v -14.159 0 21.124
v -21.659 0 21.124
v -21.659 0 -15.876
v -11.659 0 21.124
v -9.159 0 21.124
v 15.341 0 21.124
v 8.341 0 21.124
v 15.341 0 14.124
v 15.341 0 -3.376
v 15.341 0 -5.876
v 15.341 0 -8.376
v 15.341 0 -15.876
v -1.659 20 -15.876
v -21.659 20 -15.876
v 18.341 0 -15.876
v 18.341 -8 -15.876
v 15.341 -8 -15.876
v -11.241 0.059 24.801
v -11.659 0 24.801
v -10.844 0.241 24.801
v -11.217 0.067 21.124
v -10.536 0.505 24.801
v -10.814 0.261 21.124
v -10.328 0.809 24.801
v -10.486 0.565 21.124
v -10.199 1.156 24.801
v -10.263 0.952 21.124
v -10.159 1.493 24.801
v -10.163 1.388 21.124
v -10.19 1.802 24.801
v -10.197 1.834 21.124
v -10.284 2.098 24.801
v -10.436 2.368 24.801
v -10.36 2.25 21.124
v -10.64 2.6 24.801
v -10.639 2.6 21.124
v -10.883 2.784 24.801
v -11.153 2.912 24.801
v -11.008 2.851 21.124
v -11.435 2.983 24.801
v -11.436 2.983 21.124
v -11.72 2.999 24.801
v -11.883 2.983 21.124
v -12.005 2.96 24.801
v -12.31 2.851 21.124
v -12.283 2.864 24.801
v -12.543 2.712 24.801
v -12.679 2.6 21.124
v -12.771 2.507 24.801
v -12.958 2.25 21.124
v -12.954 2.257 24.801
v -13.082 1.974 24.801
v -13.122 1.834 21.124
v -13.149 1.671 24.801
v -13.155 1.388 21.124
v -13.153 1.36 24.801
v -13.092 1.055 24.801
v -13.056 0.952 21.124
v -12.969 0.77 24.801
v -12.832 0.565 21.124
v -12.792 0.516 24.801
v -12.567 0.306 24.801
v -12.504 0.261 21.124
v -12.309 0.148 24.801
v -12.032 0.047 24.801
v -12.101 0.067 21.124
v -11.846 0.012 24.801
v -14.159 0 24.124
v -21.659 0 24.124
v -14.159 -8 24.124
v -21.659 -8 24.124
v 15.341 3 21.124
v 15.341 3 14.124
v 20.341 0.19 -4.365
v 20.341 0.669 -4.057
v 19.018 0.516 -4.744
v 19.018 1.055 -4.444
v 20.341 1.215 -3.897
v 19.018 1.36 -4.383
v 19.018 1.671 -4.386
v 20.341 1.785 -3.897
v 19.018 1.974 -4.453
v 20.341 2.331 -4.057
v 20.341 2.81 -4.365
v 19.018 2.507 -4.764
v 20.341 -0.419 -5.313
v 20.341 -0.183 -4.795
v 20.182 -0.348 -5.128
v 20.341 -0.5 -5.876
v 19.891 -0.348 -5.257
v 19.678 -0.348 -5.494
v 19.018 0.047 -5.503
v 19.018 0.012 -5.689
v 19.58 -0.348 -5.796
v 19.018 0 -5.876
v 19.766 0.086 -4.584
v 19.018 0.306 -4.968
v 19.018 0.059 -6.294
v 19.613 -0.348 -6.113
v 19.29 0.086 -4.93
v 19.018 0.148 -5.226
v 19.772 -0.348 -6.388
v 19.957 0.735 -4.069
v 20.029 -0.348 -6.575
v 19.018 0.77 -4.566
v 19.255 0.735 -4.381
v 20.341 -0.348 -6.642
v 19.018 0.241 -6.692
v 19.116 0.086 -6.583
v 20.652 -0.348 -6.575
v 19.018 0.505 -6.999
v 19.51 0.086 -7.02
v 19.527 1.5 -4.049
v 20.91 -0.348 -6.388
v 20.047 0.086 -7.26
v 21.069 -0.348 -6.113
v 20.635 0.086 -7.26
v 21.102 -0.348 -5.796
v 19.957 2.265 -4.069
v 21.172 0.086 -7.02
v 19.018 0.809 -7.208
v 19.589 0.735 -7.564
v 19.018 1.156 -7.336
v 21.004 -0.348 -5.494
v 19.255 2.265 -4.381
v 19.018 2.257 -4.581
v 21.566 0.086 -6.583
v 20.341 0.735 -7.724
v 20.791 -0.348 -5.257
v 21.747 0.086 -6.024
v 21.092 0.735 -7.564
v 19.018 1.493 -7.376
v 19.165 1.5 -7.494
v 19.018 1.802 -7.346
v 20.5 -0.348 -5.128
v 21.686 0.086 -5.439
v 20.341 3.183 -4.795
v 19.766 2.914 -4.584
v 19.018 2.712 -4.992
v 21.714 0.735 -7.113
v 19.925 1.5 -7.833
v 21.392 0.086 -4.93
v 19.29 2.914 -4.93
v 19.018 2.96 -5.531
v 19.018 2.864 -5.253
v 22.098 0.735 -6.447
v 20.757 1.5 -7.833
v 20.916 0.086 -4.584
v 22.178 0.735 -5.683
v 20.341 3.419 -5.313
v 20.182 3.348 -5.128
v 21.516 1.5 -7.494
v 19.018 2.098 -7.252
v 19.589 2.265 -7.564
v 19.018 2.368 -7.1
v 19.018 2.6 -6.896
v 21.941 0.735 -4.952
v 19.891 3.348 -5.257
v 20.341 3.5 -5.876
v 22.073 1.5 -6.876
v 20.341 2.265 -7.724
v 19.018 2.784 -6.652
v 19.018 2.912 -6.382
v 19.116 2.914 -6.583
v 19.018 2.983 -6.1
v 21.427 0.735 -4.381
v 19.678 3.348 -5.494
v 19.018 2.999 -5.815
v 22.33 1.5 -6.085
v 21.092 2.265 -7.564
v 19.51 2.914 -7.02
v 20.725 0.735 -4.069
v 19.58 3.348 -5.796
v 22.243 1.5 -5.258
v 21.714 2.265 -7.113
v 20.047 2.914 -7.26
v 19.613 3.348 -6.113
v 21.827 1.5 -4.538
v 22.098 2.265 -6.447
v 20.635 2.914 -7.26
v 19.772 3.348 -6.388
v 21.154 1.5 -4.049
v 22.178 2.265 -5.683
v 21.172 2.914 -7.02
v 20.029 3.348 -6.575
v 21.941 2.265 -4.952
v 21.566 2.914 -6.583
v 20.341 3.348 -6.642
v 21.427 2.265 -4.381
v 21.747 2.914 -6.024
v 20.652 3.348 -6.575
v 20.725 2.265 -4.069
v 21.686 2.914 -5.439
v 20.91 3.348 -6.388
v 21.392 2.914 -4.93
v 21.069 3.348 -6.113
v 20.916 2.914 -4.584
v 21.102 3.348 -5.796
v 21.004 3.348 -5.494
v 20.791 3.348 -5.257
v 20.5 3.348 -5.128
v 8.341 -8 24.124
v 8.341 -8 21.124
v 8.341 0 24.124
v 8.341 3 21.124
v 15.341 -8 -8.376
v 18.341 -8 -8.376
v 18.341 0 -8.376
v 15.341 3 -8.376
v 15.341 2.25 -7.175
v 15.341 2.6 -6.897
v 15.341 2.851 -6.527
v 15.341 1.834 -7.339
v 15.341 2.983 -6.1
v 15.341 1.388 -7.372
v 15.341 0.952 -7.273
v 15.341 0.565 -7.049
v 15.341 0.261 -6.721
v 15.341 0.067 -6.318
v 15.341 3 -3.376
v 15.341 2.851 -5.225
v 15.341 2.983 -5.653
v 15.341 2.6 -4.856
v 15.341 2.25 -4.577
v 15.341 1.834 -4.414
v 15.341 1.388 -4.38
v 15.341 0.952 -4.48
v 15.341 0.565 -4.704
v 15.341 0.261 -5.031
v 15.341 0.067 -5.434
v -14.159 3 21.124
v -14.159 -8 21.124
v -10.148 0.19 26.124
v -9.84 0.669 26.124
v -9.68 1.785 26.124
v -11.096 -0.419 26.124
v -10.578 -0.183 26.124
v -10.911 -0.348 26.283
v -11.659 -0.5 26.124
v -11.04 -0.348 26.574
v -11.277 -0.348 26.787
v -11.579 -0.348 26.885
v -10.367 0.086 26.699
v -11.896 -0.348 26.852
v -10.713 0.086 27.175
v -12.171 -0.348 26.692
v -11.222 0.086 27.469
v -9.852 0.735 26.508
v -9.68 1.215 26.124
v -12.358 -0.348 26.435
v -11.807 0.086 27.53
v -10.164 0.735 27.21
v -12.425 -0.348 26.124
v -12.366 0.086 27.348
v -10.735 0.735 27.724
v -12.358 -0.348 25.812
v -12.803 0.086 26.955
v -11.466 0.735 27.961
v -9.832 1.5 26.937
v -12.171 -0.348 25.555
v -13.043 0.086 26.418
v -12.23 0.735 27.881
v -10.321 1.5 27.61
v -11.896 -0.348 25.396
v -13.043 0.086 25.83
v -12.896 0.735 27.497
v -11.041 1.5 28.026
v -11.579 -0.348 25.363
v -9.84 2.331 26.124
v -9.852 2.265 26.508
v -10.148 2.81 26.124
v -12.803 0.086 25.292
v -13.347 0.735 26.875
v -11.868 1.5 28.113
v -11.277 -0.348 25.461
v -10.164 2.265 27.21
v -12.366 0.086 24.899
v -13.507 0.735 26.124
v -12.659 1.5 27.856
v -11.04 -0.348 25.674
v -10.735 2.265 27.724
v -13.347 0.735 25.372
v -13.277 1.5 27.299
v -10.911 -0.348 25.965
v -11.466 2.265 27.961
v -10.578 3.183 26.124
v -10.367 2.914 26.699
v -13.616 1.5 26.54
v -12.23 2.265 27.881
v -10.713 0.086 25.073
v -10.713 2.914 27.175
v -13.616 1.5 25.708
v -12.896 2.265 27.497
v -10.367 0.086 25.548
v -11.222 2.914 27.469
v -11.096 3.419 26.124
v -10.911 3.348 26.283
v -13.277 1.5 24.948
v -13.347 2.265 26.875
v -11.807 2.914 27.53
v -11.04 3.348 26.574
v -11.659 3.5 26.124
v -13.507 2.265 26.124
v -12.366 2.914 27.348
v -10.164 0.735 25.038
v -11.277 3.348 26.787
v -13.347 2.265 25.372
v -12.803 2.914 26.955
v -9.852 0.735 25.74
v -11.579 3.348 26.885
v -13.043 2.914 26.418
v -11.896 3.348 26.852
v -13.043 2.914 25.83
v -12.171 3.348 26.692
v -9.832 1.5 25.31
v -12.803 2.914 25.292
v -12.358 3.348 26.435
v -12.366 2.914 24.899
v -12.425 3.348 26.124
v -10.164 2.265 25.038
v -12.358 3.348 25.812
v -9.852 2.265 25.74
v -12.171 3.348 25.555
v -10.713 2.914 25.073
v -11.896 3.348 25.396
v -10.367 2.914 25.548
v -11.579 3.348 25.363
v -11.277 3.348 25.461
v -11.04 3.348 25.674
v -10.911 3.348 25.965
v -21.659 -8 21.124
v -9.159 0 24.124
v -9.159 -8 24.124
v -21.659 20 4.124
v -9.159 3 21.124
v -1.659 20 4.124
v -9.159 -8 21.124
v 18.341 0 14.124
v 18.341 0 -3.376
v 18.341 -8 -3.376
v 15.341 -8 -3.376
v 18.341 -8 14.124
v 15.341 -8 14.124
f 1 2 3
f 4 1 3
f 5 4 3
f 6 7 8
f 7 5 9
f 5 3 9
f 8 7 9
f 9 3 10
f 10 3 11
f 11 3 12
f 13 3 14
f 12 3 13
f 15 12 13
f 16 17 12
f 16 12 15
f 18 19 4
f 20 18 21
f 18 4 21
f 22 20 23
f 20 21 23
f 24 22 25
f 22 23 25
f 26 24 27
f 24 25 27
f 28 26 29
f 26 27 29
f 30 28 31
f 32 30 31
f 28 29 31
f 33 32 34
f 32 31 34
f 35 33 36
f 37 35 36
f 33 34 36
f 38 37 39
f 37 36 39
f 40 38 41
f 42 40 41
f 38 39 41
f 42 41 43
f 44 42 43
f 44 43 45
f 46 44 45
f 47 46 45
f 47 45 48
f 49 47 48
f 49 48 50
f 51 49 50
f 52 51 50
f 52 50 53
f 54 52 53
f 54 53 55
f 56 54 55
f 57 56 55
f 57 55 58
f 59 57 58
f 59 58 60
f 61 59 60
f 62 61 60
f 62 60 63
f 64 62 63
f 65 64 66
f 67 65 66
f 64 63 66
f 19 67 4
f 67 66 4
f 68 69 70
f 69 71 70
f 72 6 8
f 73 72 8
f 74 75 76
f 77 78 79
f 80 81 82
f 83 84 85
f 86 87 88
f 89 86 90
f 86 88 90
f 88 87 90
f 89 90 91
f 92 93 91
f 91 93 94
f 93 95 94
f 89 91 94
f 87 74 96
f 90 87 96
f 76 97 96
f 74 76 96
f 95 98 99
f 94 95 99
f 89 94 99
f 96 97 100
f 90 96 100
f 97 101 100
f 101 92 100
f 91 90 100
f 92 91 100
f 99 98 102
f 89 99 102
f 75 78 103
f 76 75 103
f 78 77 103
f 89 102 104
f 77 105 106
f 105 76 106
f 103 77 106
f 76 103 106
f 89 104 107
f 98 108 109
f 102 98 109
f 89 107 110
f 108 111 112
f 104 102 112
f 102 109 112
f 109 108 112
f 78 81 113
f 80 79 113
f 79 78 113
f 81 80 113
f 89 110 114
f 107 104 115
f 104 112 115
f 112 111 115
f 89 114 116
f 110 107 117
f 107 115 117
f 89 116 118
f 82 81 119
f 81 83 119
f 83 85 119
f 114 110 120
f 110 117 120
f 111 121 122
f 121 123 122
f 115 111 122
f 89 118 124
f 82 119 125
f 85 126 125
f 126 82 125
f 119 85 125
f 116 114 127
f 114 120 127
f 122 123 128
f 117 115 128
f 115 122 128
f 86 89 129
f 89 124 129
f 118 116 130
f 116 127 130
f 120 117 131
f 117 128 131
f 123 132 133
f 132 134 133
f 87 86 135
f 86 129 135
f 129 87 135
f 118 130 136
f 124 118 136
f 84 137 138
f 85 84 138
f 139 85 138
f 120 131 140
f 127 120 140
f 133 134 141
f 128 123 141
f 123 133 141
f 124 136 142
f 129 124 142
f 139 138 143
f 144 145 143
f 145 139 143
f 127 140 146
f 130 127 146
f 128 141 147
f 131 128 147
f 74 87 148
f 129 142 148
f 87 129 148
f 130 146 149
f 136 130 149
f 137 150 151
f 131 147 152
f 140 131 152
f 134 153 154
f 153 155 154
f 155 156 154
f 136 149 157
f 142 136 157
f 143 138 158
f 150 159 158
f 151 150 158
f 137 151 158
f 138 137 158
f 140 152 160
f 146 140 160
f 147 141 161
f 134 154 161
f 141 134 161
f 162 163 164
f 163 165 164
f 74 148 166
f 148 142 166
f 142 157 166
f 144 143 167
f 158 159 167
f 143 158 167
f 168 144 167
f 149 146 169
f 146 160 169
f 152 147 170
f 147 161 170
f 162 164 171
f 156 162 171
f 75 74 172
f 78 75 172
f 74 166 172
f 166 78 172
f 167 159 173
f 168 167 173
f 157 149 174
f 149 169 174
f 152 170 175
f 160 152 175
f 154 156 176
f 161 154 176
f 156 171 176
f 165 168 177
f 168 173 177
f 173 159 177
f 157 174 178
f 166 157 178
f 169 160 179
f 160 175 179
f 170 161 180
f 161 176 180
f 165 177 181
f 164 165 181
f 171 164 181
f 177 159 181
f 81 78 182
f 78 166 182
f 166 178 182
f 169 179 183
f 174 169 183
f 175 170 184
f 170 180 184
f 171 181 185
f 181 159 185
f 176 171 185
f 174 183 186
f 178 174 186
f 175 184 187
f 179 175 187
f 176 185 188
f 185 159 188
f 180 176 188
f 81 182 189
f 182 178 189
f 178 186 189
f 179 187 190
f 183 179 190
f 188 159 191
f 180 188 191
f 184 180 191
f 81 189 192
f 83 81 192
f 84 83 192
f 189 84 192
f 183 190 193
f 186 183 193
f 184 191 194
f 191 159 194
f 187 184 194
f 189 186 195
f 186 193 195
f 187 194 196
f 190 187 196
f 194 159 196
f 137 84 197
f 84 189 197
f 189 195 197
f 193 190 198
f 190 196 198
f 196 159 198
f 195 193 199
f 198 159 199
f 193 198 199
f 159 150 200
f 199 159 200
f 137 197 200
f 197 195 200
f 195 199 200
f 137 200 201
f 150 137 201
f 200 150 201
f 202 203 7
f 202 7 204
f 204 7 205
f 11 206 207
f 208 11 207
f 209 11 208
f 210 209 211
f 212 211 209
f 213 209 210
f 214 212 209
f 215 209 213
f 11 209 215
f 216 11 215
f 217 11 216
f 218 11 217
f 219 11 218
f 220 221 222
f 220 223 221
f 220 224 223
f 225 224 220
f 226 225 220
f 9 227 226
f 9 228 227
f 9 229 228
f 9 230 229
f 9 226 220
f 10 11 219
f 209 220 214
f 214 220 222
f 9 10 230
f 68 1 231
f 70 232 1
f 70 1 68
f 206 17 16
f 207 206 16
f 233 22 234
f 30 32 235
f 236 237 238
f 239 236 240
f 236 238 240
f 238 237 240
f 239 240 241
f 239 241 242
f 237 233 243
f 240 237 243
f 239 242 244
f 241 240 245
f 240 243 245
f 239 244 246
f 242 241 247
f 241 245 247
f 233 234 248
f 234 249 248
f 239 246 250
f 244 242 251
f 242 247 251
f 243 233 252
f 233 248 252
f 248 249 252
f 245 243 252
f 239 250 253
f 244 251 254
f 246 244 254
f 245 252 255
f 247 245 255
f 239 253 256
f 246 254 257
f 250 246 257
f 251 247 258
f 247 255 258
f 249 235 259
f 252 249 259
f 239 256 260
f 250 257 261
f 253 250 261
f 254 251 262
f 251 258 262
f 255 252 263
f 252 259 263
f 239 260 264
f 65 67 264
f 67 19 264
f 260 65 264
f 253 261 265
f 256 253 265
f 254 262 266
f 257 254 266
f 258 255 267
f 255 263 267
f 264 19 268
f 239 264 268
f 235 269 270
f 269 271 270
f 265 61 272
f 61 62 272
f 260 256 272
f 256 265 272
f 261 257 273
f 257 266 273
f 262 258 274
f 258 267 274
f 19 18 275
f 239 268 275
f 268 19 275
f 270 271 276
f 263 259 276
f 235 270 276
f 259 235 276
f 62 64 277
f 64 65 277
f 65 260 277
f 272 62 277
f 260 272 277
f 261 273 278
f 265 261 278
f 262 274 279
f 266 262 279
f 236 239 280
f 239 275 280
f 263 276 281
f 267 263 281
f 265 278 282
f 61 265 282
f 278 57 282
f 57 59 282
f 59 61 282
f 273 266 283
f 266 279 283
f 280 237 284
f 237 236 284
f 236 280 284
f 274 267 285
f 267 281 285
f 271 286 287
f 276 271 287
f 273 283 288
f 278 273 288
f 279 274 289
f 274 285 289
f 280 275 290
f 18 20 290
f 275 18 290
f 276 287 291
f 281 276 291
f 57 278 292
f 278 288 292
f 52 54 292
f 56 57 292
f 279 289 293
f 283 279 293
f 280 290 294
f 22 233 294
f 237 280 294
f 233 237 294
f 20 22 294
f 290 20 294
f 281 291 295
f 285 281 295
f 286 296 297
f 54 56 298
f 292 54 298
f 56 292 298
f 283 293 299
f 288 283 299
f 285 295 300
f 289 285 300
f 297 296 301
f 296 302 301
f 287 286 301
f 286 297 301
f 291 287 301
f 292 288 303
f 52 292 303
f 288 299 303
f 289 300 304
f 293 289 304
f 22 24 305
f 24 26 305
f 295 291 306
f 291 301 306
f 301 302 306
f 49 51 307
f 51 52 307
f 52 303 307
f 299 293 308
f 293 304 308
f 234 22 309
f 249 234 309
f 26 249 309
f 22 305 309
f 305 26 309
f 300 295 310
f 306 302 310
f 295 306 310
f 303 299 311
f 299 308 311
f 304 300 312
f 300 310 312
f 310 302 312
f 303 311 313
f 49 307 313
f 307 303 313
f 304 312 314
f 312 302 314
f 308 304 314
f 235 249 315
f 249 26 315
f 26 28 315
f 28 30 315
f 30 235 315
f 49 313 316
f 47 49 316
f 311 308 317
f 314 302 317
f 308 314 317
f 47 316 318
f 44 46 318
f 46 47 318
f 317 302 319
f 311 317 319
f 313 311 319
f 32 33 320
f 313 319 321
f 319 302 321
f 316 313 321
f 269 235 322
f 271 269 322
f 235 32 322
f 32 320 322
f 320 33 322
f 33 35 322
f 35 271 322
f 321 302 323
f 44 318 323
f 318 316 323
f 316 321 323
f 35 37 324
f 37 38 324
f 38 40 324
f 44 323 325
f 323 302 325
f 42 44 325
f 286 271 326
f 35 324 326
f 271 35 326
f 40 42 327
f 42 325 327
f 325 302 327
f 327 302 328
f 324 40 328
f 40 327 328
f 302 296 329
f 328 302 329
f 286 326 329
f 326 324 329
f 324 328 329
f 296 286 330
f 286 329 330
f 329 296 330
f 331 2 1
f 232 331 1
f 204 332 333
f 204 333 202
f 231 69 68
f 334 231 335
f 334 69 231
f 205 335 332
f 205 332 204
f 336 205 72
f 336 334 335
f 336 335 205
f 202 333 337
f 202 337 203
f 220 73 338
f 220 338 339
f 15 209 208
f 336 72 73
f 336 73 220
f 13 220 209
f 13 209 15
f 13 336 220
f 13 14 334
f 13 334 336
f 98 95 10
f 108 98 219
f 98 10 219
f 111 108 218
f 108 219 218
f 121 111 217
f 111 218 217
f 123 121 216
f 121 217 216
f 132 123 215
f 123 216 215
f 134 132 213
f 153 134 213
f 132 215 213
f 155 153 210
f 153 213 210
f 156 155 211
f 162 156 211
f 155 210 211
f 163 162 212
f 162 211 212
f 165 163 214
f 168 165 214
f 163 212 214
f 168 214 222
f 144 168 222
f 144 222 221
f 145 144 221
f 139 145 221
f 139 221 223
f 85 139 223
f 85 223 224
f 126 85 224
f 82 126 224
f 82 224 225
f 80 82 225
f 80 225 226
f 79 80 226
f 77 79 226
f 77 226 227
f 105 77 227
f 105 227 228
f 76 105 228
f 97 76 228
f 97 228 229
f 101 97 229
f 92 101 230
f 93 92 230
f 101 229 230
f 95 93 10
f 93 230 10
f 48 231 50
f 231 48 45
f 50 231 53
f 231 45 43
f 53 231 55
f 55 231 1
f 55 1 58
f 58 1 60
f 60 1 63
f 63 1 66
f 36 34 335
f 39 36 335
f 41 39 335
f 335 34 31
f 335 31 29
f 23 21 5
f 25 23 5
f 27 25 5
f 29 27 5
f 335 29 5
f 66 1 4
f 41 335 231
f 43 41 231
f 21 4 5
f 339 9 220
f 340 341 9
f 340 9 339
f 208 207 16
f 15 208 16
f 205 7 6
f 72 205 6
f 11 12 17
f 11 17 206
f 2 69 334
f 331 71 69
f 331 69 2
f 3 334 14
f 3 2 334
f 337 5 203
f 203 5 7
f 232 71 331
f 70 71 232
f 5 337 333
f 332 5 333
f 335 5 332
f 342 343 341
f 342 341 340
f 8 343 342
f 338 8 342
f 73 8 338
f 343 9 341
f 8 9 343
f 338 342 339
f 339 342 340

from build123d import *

# Parameters (mm, degrees)
SKETCH1_W           = 40
SKETCH1_H           = 40
BOSS_EXTRUDE1_DEPTH = 20
CHAMFER1_SIZE       = 20
SKETCH2_W           = 3
SKETCH2_H           = 5
SKETCH2_W_2         = 5
SKETCH2_H_2         = 3
CUT_EXTRUDE1_DEPTH  = 20
SKETCH3_W           = 17.5
SKETCH3_H           = 3
SKETCH3_W_2         = 3
SKETCH3_H_2         = 17.5
SKETCH3_H_3         = 7.5
SKETCH3_W_3         = 7.5
BOSS_EXTRUDE2_DEPTH = 8
SKETCH4_R           = 1.5
BOSS_EXTRUDE3_DEPTH = 5
SKETCH6_R           = 1.5
BOSS_EXTRUDE4_DEPTH = 5


with BuildPart() as part:
    # Sketch1 → Boss-Extrude1 (new body)
    with BuildSketch(Plane(origin=(0, 0, 0), x_dir=(1, 0, 0), z_dir=(0, 1, 0))):
        with Locations((-1.65921027, -4.12371134)):
            Rectangle(SKETCH1_W, SKETCH1_H)
    extrude(amount=BOSS_EXTRUDE1_DEPTH)

    # Chamfer1
    chamfer1_edges = [part.edges().sort_by_distance(p)[0] for p in [
        (18.34078973, 20, 4.12371134),
        (-1.65921027, 20, 24.12371134),
    ]]
    chamfer(chamfer1_edges, length=CHAMFER1_SIZE - 0.0001)  # a hair under: the kernel refuses the full size

    # Sketch2 → Cut-Extrude1 (cut)
    with BuildSketch(Plane.XZ):
        Polygon((15.34078973, 21.12371134), (15.34078973, 14.12371134), (18.34078973, 14.12371134), (18.34078973, 24.12371134), (8.34078973, 24.12371134), (8.34078973, 21.12371134), align=None)
        with Locations((16.84078973, -5.87628866)):
            Rectangle(SKETCH2_W, SKETCH2_H)
        with Locations((-11.65921027, 22.62371134)):
            Rectangle(SKETCH2_W_2, SKETCH2_H_2)
    extrude(amount=-CUT_EXTRUDE1_DEPTH, mode=Mode.SUBTRACT)

    # Sketch3 → Boss-Extrude2 (add)
    with BuildSketch(Plane.XZ):
        with Locations((-0.40921027, 22.62371134)):
            Rectangle(SKETCH3_W, SKETCH3_H)
        with Locations((16.84078973, 5.37371134)):
            Rectangle(SKETCH3_W_2, SKETCH3_H_2)
        with Locations((16.84078973, -12.12628866)):
            Rectangle(SKETCH3_W_2, SKETCH3_H_3)
        with Locations((-17.90921027, 22.62371134)):
            Rectangle(SKETCH3_W_3, SKETCH3_H)
    extrude(amount=BOSS_EXTRUDE2_DEPTH)

    # Sketch4 → Boss-Extrude3 (add)
    with BuildSketch(Plane.XY.offset(21.12371134)):
        with Locations(Location((-11.65921027, 1.5, 0), (0, 0, 270))):
            Circle(SKETCH4_R)
    extrude(amount=BOSS_EXTRUDE3_DEPTH)

    # Sketch5 → Revolve1 (revolve)
    with BuildSketch(Plane.XY.offset(26.12371134)):
        with BuildLine():
            Line((-11.65921027, 3.5), (-11.65921027, -0.5))
            ThreePointArc((-11.65921027, -0.5), (-9.65921027, 1.5), (-11.65921027, 3.5))
        make_face()
    revolve(axis=Axis((-11.65921027, 3.5, 26.12371134), (0, -1, 0)))

    # Sketch6 → Boss-Extrude4 (add)
    with BuildSketch(Plane(origin=(15.34078973, 0, 0), x_dir=(0, 0, -1), z_dir=(1, 0, 0))):
        with Locations(Location((5.87628866, 1.5, 0), (0, 0, 270))):
            Circle(SKETCH6_R)
    extrude(amount=BOSS_EXTRUDE4_DEPTH)

    # Sketch7 → Revolve2 (revolve)
    with BuildSketch(Plane(origin=(20.34078973, 0, 0), x_dir=(0, 0, -1), z_dir=(1, 0, 0))):
        with BuildLine():
            Line((5.87628866, 3.5), (5.87628866, -0.5))
            ThreePointArc((5.87628866, -0.5), (3.87628866, 1.5), (5.87628866, 3.5))
        make_face()
    revolve(axis=Axis((20.34078973, 3.5, -5.87628866), (0, -1, 0)))


solid = part.part
